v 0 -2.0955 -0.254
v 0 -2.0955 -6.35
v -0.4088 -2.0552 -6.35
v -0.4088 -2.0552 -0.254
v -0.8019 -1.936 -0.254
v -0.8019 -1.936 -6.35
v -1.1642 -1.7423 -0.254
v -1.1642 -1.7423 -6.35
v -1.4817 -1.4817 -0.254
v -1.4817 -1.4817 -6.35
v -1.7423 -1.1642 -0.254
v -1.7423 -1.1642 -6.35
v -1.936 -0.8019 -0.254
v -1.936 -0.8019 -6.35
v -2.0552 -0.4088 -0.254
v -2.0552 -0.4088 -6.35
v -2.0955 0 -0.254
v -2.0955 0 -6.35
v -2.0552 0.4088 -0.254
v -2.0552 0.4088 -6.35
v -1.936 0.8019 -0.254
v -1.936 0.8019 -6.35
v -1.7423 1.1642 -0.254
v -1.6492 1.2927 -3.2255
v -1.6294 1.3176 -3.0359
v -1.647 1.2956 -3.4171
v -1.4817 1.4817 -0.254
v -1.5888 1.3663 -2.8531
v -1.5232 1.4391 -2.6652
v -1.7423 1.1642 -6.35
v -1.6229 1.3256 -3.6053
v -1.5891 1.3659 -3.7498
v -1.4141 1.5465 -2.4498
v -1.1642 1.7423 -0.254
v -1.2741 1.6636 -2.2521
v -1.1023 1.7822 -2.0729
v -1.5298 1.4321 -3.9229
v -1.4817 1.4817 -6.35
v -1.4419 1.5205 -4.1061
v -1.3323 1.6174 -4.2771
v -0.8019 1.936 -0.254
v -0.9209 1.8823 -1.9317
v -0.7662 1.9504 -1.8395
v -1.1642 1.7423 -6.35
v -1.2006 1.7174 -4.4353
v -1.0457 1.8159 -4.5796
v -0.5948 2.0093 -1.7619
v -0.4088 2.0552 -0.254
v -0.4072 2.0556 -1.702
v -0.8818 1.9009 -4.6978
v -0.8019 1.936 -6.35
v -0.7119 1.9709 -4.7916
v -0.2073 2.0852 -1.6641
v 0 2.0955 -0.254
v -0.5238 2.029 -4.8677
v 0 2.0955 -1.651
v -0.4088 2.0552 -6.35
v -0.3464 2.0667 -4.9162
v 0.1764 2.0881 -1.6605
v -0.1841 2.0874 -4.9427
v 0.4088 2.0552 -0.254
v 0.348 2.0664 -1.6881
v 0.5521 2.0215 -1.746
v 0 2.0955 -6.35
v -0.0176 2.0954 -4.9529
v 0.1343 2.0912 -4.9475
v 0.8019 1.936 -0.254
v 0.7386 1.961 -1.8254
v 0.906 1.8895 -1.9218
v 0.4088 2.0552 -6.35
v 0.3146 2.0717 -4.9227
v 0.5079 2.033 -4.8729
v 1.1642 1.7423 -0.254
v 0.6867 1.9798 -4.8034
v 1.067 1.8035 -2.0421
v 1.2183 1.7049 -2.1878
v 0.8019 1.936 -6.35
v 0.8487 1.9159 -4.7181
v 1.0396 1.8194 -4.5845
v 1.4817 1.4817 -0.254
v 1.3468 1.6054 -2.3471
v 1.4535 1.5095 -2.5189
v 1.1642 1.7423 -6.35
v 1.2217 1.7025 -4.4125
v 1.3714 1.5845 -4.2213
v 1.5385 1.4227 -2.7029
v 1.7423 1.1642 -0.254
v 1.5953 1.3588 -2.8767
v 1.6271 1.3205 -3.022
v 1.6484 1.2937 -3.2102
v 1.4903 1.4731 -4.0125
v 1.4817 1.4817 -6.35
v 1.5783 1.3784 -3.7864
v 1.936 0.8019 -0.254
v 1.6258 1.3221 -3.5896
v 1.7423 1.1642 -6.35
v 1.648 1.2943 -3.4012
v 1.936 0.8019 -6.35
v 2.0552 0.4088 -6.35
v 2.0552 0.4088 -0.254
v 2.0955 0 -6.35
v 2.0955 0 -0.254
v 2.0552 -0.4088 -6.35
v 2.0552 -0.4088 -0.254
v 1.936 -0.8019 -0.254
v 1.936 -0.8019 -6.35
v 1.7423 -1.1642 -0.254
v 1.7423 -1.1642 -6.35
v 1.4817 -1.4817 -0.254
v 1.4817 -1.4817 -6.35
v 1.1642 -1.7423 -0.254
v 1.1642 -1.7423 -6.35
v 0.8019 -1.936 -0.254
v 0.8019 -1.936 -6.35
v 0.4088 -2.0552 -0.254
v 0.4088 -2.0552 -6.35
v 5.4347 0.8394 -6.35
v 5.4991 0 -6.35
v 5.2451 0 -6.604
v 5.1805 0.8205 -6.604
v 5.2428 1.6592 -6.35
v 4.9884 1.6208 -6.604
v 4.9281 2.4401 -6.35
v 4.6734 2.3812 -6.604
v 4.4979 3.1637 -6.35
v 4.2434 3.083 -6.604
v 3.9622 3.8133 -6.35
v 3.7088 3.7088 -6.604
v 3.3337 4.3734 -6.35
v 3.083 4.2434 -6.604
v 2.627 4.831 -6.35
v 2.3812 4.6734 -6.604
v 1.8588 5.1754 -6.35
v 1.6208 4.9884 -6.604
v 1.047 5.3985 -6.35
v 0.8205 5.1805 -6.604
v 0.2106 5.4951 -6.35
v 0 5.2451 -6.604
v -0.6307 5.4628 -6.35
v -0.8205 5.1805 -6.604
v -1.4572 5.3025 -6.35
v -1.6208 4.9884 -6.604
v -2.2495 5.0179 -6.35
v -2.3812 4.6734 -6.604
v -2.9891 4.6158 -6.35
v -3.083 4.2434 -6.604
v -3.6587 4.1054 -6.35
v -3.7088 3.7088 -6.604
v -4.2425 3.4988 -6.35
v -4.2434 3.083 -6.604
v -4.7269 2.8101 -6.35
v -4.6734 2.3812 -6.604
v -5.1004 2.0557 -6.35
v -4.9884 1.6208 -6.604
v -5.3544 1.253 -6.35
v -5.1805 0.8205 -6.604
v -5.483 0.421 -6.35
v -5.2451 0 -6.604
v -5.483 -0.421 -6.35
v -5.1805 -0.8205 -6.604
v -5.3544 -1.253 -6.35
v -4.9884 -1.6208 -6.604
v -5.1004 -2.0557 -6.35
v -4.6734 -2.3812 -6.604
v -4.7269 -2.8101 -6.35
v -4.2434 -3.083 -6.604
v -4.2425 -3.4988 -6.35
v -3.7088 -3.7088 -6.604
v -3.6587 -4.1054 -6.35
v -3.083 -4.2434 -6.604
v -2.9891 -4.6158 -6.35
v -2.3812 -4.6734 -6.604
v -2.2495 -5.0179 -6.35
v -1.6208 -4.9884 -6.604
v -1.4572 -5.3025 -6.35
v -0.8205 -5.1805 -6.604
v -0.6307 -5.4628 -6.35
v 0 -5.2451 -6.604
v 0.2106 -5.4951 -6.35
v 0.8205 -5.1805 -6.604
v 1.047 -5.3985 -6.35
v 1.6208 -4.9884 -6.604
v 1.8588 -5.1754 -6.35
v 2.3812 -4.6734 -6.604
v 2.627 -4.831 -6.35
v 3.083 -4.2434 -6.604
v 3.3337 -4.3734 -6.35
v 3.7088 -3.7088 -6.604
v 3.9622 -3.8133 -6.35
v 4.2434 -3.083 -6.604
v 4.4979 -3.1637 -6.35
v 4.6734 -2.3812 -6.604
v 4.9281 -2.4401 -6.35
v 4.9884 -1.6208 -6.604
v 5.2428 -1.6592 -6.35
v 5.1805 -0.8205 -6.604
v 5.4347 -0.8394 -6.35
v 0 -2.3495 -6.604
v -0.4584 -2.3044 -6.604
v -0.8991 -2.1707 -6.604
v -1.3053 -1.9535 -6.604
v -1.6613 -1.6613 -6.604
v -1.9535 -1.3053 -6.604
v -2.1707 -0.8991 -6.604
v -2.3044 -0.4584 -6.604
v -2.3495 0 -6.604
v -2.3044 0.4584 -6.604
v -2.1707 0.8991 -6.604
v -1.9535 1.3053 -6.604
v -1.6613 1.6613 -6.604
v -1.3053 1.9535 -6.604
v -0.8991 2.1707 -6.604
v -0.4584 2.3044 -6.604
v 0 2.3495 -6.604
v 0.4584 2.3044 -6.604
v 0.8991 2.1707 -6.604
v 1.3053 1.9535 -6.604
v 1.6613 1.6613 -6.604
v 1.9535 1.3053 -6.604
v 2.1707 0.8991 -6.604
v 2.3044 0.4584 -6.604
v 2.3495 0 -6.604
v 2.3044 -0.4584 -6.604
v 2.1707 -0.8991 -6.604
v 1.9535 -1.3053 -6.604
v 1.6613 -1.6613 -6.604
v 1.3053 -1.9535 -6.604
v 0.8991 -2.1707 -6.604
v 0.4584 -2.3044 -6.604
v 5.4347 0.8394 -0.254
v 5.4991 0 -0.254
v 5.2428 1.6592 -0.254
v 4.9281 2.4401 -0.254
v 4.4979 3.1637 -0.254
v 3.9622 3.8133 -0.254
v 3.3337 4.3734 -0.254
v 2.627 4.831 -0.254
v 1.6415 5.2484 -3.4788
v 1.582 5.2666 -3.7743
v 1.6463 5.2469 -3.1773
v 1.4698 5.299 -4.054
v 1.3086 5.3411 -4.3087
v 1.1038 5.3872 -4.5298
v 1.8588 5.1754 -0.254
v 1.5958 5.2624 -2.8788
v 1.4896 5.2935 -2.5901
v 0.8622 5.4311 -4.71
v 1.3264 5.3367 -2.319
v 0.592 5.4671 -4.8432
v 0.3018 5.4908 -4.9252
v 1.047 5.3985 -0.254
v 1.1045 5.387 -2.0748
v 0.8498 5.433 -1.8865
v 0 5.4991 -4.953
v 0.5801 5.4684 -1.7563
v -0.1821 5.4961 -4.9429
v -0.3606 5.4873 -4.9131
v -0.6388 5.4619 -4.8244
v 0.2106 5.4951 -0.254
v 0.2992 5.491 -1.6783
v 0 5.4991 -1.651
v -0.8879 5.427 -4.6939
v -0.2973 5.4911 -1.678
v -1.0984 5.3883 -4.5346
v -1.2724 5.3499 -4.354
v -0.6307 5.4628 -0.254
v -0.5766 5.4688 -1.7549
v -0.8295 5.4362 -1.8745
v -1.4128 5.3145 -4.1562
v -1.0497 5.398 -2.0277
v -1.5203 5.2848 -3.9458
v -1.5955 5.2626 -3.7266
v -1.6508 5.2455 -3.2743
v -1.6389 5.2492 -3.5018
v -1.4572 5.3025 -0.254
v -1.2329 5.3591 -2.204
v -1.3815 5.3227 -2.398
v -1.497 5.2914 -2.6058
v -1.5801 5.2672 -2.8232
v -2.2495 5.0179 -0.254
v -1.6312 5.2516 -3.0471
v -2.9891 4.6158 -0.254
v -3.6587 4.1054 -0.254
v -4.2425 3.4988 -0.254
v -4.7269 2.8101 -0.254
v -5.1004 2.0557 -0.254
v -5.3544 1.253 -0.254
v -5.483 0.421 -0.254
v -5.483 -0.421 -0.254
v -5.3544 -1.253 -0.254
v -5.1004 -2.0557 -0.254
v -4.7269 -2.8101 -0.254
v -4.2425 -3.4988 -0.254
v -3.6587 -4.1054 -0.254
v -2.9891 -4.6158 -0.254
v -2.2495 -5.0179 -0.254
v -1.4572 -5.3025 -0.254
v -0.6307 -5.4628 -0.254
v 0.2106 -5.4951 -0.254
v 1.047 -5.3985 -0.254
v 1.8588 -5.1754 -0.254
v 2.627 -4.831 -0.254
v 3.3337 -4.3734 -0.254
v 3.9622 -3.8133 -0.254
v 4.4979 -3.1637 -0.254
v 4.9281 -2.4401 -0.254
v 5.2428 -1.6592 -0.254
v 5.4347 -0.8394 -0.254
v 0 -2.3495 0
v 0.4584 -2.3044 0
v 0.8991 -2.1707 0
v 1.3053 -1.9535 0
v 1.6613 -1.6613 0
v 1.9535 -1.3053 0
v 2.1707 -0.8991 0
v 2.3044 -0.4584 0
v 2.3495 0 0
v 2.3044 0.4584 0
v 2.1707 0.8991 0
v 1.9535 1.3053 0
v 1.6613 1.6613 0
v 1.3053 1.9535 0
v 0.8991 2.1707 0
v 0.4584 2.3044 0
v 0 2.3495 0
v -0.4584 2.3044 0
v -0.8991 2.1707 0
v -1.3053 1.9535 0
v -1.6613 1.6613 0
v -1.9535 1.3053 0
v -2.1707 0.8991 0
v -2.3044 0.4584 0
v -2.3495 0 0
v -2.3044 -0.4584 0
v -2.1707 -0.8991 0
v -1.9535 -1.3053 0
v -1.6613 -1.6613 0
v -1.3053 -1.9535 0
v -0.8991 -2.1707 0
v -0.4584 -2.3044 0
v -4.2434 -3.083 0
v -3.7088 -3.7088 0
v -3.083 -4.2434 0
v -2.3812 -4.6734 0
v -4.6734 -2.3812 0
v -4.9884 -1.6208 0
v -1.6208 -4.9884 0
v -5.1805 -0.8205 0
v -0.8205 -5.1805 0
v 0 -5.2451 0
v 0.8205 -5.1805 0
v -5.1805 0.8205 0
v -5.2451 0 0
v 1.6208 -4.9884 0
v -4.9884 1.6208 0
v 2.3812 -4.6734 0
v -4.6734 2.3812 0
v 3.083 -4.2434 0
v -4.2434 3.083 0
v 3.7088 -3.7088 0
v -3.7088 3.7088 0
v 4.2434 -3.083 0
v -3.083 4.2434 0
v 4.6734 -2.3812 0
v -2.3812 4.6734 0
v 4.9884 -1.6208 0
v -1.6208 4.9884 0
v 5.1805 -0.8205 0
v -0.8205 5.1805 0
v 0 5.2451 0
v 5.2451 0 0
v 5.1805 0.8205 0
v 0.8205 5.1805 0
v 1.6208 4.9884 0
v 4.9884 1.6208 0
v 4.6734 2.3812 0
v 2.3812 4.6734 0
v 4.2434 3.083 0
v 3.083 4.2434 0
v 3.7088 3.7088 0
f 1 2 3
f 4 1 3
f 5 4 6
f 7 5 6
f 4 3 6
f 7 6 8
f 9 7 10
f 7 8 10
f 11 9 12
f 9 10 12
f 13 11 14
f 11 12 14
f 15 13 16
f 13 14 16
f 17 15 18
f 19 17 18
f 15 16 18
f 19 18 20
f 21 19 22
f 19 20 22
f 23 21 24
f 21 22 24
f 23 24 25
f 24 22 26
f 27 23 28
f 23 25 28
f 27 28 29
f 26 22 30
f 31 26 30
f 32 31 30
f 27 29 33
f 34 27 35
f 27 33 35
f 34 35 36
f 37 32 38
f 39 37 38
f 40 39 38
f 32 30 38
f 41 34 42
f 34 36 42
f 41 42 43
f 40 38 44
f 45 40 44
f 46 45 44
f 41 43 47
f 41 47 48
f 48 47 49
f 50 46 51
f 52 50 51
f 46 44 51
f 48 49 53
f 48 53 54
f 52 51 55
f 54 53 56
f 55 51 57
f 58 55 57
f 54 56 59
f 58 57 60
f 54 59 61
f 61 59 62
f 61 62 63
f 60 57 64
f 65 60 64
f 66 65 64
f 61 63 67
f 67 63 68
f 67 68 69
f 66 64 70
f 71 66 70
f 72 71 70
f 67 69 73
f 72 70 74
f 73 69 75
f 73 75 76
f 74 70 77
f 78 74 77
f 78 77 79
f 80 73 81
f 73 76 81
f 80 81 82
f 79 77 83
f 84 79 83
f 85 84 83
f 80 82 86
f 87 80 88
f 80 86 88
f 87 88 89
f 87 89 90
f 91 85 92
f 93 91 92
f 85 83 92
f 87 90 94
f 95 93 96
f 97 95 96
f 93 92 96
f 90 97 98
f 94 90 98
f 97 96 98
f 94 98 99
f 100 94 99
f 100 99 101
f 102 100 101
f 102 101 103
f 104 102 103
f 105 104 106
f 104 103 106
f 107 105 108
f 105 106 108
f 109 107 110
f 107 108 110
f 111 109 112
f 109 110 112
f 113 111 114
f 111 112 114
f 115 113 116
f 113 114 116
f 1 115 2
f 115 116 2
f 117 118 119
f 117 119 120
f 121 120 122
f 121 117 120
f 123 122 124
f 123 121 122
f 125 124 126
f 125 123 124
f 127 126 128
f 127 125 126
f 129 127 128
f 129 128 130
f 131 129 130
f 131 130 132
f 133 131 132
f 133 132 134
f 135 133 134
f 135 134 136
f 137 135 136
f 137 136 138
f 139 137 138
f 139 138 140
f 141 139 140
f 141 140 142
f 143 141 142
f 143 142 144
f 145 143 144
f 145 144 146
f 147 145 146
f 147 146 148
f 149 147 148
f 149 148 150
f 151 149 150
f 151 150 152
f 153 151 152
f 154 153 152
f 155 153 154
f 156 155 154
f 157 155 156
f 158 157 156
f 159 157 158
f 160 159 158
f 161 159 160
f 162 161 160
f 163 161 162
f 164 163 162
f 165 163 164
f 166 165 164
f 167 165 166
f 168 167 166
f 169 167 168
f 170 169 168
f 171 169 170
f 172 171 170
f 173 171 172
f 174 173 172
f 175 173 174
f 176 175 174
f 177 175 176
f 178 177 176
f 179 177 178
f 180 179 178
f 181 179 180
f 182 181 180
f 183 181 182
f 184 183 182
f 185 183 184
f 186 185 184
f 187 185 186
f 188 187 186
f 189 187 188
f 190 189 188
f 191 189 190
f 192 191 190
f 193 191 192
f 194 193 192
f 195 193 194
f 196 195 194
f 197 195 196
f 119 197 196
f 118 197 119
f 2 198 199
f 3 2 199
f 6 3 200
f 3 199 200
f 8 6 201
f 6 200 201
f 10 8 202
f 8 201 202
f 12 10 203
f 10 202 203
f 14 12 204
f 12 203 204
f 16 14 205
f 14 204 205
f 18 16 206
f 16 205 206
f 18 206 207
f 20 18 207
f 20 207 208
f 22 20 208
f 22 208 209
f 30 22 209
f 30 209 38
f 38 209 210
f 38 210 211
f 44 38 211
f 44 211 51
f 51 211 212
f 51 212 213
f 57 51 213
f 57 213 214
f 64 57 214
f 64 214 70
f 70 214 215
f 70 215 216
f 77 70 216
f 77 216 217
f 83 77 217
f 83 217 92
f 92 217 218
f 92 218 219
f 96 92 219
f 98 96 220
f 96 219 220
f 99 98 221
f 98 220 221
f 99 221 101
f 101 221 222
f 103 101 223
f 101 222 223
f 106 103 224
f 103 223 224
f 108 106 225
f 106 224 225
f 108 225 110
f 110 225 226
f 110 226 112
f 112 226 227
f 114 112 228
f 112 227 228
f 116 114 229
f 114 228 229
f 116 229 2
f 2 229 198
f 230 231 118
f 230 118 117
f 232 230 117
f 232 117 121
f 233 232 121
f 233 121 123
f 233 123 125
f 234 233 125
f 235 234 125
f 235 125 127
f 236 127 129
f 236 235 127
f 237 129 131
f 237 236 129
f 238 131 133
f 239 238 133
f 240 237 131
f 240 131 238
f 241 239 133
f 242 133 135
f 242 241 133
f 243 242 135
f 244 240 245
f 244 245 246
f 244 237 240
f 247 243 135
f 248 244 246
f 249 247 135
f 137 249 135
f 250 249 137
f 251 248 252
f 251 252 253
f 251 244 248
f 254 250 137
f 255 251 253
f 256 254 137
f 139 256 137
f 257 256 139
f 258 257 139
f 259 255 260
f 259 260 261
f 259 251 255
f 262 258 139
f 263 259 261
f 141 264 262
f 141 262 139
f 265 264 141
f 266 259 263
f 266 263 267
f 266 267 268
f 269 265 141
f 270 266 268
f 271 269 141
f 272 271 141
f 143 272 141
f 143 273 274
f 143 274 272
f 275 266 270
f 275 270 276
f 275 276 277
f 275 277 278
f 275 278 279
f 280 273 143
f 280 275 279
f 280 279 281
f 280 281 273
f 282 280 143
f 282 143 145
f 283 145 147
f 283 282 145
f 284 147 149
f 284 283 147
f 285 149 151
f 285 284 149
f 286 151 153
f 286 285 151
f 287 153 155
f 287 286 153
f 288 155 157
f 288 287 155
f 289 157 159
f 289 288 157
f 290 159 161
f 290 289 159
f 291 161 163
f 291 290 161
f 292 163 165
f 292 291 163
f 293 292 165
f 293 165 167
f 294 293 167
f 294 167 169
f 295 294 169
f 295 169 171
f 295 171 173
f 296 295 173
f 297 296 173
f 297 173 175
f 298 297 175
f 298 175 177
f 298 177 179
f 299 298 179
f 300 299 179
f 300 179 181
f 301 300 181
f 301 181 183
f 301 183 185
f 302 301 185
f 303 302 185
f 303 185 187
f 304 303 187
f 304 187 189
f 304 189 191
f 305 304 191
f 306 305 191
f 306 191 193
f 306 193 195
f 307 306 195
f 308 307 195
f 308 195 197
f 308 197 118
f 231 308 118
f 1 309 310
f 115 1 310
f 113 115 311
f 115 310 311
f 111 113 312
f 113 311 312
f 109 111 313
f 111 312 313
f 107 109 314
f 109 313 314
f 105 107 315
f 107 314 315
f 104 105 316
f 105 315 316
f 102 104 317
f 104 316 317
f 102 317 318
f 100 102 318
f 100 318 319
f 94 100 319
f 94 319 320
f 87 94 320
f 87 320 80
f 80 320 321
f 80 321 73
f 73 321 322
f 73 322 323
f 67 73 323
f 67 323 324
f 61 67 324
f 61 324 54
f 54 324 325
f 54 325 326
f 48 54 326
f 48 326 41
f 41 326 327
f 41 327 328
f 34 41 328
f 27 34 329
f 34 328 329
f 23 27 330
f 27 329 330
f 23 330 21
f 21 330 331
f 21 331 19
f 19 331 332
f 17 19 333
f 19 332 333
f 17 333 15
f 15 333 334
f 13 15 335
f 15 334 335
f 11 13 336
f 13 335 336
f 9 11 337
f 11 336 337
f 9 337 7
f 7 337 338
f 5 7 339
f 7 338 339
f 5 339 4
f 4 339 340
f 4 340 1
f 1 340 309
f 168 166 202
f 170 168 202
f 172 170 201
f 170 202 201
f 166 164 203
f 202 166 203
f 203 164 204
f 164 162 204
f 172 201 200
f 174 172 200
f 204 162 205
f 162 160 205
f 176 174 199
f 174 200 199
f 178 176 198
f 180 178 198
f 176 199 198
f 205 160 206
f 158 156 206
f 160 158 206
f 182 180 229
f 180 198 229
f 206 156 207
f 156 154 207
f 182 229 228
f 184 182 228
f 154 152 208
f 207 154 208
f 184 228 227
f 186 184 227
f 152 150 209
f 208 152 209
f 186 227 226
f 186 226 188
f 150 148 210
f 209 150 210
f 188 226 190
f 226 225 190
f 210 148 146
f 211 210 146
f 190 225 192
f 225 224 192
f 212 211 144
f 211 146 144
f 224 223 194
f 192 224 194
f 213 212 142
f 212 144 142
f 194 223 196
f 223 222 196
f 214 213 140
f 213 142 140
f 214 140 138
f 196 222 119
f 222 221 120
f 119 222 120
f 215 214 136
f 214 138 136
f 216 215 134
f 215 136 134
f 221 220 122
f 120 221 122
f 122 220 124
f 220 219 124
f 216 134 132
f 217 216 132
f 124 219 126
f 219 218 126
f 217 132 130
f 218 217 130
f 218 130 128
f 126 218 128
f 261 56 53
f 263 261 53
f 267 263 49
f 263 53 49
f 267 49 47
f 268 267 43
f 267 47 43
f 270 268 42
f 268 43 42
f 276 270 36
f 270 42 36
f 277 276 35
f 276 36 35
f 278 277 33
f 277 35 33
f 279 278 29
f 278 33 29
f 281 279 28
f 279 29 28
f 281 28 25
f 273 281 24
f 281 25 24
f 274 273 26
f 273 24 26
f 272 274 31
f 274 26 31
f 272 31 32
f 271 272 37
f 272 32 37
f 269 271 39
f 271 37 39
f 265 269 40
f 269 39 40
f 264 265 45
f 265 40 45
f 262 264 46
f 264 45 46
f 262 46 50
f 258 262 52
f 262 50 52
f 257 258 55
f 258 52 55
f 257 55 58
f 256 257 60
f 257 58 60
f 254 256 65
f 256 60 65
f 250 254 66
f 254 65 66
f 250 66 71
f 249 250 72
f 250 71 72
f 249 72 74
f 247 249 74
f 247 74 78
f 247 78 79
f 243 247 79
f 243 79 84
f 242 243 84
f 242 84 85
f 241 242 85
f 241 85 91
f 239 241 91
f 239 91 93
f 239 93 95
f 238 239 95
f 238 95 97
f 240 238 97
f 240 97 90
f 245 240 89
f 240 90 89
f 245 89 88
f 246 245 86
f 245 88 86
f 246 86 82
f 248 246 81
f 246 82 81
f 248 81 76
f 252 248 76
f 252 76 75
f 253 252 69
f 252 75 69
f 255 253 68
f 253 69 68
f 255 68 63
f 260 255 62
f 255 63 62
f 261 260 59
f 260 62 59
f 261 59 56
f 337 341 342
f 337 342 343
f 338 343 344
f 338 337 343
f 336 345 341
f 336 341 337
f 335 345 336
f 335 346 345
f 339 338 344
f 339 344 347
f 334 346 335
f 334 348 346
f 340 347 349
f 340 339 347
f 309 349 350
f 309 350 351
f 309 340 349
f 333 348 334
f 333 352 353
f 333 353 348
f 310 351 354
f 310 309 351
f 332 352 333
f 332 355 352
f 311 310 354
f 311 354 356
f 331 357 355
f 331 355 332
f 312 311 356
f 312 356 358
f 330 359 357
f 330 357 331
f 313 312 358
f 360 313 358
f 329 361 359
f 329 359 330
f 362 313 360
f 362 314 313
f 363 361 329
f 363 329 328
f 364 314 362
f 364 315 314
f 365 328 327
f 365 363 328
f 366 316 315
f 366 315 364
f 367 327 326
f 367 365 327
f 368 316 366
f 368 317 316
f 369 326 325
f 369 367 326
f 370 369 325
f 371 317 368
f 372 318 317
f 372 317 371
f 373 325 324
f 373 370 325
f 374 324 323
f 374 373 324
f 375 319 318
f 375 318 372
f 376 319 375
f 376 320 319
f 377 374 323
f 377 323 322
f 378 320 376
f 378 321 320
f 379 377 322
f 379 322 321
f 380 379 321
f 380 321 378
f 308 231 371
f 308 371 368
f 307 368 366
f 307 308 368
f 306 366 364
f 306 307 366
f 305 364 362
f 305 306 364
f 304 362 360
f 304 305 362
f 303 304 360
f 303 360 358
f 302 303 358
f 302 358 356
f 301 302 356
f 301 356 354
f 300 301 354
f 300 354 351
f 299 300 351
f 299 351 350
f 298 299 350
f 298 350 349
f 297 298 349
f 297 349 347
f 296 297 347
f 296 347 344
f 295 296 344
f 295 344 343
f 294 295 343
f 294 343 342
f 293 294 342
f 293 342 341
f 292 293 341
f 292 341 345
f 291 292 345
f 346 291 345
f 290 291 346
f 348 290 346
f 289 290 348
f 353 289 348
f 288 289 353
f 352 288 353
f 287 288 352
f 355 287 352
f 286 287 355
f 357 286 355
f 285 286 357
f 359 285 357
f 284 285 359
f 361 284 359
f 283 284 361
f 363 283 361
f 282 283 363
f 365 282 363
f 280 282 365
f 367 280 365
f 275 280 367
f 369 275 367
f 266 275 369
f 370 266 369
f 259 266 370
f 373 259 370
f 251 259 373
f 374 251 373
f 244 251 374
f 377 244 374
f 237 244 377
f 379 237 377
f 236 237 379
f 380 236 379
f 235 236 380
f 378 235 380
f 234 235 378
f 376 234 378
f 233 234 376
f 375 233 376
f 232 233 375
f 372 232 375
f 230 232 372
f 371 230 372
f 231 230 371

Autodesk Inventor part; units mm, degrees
ref_plane "YZ Plane" through (0, 0, 0) normal (1, 0, 0) x (0, 1, 0)
ref_plane "XY Plane" through (0, 0, 0) normal (0, 0, 1) x (1, 0, 0)
sketch "Sketch1" plane through (0, 0, 0) normal (0, 0, 1) x (1, 0, 0)
  circle A0 centre (0, 0) radius 5.4991
  dimension "d0" = 10.9982
extrude "Extrusion1" add sketch "Sketch1" against normal blind 6.604
chamfer "Chamfer1" distance 0.254 angle 45 2 edges at (-5.4991, 0, 0) (-5.4991, 0, -6.604)
sketch "Sketch2" plane through (0, 0, 0) normal (0, 0, 1) x (1, 0, 0)
  circle A0 centre (0, 0) radius 5.2451 projected
hole "Hole1" at (0, 0, 0) direction (0, 0, -1) diameter 4.191 end through all
ref_plane "Work Plane1" through (0, 5.4991, 0) normal (0, 1, 0) x (-1, 0, 0)
sketch "Sketch3" plane through (0, 5.4991, 0) normal (0, 1, 0) x (-1, 0, 0)
  line L0 (-5.2451, 0) -> (5.2451, 0) projected
  line L1 (5.4991, -0.254) -> (5.4991, -6.35) projected
  point P0 (0, 0)
  point P1 (0, -3.302)
hole "Hole2" at (0, 5.4991, -3.302) direction (0, -1, 0) diameter 3.302 end up to surface thread size "8-32 UNC" class "2B" standard "ANSI Unified Screw Threads"
chamfer "Chamfer2" distance 0.254 angle 45 2 edges at (0, 2.0955, 0) (0, 2.0955, -6.604)
properties part number "Shaft Collar"
